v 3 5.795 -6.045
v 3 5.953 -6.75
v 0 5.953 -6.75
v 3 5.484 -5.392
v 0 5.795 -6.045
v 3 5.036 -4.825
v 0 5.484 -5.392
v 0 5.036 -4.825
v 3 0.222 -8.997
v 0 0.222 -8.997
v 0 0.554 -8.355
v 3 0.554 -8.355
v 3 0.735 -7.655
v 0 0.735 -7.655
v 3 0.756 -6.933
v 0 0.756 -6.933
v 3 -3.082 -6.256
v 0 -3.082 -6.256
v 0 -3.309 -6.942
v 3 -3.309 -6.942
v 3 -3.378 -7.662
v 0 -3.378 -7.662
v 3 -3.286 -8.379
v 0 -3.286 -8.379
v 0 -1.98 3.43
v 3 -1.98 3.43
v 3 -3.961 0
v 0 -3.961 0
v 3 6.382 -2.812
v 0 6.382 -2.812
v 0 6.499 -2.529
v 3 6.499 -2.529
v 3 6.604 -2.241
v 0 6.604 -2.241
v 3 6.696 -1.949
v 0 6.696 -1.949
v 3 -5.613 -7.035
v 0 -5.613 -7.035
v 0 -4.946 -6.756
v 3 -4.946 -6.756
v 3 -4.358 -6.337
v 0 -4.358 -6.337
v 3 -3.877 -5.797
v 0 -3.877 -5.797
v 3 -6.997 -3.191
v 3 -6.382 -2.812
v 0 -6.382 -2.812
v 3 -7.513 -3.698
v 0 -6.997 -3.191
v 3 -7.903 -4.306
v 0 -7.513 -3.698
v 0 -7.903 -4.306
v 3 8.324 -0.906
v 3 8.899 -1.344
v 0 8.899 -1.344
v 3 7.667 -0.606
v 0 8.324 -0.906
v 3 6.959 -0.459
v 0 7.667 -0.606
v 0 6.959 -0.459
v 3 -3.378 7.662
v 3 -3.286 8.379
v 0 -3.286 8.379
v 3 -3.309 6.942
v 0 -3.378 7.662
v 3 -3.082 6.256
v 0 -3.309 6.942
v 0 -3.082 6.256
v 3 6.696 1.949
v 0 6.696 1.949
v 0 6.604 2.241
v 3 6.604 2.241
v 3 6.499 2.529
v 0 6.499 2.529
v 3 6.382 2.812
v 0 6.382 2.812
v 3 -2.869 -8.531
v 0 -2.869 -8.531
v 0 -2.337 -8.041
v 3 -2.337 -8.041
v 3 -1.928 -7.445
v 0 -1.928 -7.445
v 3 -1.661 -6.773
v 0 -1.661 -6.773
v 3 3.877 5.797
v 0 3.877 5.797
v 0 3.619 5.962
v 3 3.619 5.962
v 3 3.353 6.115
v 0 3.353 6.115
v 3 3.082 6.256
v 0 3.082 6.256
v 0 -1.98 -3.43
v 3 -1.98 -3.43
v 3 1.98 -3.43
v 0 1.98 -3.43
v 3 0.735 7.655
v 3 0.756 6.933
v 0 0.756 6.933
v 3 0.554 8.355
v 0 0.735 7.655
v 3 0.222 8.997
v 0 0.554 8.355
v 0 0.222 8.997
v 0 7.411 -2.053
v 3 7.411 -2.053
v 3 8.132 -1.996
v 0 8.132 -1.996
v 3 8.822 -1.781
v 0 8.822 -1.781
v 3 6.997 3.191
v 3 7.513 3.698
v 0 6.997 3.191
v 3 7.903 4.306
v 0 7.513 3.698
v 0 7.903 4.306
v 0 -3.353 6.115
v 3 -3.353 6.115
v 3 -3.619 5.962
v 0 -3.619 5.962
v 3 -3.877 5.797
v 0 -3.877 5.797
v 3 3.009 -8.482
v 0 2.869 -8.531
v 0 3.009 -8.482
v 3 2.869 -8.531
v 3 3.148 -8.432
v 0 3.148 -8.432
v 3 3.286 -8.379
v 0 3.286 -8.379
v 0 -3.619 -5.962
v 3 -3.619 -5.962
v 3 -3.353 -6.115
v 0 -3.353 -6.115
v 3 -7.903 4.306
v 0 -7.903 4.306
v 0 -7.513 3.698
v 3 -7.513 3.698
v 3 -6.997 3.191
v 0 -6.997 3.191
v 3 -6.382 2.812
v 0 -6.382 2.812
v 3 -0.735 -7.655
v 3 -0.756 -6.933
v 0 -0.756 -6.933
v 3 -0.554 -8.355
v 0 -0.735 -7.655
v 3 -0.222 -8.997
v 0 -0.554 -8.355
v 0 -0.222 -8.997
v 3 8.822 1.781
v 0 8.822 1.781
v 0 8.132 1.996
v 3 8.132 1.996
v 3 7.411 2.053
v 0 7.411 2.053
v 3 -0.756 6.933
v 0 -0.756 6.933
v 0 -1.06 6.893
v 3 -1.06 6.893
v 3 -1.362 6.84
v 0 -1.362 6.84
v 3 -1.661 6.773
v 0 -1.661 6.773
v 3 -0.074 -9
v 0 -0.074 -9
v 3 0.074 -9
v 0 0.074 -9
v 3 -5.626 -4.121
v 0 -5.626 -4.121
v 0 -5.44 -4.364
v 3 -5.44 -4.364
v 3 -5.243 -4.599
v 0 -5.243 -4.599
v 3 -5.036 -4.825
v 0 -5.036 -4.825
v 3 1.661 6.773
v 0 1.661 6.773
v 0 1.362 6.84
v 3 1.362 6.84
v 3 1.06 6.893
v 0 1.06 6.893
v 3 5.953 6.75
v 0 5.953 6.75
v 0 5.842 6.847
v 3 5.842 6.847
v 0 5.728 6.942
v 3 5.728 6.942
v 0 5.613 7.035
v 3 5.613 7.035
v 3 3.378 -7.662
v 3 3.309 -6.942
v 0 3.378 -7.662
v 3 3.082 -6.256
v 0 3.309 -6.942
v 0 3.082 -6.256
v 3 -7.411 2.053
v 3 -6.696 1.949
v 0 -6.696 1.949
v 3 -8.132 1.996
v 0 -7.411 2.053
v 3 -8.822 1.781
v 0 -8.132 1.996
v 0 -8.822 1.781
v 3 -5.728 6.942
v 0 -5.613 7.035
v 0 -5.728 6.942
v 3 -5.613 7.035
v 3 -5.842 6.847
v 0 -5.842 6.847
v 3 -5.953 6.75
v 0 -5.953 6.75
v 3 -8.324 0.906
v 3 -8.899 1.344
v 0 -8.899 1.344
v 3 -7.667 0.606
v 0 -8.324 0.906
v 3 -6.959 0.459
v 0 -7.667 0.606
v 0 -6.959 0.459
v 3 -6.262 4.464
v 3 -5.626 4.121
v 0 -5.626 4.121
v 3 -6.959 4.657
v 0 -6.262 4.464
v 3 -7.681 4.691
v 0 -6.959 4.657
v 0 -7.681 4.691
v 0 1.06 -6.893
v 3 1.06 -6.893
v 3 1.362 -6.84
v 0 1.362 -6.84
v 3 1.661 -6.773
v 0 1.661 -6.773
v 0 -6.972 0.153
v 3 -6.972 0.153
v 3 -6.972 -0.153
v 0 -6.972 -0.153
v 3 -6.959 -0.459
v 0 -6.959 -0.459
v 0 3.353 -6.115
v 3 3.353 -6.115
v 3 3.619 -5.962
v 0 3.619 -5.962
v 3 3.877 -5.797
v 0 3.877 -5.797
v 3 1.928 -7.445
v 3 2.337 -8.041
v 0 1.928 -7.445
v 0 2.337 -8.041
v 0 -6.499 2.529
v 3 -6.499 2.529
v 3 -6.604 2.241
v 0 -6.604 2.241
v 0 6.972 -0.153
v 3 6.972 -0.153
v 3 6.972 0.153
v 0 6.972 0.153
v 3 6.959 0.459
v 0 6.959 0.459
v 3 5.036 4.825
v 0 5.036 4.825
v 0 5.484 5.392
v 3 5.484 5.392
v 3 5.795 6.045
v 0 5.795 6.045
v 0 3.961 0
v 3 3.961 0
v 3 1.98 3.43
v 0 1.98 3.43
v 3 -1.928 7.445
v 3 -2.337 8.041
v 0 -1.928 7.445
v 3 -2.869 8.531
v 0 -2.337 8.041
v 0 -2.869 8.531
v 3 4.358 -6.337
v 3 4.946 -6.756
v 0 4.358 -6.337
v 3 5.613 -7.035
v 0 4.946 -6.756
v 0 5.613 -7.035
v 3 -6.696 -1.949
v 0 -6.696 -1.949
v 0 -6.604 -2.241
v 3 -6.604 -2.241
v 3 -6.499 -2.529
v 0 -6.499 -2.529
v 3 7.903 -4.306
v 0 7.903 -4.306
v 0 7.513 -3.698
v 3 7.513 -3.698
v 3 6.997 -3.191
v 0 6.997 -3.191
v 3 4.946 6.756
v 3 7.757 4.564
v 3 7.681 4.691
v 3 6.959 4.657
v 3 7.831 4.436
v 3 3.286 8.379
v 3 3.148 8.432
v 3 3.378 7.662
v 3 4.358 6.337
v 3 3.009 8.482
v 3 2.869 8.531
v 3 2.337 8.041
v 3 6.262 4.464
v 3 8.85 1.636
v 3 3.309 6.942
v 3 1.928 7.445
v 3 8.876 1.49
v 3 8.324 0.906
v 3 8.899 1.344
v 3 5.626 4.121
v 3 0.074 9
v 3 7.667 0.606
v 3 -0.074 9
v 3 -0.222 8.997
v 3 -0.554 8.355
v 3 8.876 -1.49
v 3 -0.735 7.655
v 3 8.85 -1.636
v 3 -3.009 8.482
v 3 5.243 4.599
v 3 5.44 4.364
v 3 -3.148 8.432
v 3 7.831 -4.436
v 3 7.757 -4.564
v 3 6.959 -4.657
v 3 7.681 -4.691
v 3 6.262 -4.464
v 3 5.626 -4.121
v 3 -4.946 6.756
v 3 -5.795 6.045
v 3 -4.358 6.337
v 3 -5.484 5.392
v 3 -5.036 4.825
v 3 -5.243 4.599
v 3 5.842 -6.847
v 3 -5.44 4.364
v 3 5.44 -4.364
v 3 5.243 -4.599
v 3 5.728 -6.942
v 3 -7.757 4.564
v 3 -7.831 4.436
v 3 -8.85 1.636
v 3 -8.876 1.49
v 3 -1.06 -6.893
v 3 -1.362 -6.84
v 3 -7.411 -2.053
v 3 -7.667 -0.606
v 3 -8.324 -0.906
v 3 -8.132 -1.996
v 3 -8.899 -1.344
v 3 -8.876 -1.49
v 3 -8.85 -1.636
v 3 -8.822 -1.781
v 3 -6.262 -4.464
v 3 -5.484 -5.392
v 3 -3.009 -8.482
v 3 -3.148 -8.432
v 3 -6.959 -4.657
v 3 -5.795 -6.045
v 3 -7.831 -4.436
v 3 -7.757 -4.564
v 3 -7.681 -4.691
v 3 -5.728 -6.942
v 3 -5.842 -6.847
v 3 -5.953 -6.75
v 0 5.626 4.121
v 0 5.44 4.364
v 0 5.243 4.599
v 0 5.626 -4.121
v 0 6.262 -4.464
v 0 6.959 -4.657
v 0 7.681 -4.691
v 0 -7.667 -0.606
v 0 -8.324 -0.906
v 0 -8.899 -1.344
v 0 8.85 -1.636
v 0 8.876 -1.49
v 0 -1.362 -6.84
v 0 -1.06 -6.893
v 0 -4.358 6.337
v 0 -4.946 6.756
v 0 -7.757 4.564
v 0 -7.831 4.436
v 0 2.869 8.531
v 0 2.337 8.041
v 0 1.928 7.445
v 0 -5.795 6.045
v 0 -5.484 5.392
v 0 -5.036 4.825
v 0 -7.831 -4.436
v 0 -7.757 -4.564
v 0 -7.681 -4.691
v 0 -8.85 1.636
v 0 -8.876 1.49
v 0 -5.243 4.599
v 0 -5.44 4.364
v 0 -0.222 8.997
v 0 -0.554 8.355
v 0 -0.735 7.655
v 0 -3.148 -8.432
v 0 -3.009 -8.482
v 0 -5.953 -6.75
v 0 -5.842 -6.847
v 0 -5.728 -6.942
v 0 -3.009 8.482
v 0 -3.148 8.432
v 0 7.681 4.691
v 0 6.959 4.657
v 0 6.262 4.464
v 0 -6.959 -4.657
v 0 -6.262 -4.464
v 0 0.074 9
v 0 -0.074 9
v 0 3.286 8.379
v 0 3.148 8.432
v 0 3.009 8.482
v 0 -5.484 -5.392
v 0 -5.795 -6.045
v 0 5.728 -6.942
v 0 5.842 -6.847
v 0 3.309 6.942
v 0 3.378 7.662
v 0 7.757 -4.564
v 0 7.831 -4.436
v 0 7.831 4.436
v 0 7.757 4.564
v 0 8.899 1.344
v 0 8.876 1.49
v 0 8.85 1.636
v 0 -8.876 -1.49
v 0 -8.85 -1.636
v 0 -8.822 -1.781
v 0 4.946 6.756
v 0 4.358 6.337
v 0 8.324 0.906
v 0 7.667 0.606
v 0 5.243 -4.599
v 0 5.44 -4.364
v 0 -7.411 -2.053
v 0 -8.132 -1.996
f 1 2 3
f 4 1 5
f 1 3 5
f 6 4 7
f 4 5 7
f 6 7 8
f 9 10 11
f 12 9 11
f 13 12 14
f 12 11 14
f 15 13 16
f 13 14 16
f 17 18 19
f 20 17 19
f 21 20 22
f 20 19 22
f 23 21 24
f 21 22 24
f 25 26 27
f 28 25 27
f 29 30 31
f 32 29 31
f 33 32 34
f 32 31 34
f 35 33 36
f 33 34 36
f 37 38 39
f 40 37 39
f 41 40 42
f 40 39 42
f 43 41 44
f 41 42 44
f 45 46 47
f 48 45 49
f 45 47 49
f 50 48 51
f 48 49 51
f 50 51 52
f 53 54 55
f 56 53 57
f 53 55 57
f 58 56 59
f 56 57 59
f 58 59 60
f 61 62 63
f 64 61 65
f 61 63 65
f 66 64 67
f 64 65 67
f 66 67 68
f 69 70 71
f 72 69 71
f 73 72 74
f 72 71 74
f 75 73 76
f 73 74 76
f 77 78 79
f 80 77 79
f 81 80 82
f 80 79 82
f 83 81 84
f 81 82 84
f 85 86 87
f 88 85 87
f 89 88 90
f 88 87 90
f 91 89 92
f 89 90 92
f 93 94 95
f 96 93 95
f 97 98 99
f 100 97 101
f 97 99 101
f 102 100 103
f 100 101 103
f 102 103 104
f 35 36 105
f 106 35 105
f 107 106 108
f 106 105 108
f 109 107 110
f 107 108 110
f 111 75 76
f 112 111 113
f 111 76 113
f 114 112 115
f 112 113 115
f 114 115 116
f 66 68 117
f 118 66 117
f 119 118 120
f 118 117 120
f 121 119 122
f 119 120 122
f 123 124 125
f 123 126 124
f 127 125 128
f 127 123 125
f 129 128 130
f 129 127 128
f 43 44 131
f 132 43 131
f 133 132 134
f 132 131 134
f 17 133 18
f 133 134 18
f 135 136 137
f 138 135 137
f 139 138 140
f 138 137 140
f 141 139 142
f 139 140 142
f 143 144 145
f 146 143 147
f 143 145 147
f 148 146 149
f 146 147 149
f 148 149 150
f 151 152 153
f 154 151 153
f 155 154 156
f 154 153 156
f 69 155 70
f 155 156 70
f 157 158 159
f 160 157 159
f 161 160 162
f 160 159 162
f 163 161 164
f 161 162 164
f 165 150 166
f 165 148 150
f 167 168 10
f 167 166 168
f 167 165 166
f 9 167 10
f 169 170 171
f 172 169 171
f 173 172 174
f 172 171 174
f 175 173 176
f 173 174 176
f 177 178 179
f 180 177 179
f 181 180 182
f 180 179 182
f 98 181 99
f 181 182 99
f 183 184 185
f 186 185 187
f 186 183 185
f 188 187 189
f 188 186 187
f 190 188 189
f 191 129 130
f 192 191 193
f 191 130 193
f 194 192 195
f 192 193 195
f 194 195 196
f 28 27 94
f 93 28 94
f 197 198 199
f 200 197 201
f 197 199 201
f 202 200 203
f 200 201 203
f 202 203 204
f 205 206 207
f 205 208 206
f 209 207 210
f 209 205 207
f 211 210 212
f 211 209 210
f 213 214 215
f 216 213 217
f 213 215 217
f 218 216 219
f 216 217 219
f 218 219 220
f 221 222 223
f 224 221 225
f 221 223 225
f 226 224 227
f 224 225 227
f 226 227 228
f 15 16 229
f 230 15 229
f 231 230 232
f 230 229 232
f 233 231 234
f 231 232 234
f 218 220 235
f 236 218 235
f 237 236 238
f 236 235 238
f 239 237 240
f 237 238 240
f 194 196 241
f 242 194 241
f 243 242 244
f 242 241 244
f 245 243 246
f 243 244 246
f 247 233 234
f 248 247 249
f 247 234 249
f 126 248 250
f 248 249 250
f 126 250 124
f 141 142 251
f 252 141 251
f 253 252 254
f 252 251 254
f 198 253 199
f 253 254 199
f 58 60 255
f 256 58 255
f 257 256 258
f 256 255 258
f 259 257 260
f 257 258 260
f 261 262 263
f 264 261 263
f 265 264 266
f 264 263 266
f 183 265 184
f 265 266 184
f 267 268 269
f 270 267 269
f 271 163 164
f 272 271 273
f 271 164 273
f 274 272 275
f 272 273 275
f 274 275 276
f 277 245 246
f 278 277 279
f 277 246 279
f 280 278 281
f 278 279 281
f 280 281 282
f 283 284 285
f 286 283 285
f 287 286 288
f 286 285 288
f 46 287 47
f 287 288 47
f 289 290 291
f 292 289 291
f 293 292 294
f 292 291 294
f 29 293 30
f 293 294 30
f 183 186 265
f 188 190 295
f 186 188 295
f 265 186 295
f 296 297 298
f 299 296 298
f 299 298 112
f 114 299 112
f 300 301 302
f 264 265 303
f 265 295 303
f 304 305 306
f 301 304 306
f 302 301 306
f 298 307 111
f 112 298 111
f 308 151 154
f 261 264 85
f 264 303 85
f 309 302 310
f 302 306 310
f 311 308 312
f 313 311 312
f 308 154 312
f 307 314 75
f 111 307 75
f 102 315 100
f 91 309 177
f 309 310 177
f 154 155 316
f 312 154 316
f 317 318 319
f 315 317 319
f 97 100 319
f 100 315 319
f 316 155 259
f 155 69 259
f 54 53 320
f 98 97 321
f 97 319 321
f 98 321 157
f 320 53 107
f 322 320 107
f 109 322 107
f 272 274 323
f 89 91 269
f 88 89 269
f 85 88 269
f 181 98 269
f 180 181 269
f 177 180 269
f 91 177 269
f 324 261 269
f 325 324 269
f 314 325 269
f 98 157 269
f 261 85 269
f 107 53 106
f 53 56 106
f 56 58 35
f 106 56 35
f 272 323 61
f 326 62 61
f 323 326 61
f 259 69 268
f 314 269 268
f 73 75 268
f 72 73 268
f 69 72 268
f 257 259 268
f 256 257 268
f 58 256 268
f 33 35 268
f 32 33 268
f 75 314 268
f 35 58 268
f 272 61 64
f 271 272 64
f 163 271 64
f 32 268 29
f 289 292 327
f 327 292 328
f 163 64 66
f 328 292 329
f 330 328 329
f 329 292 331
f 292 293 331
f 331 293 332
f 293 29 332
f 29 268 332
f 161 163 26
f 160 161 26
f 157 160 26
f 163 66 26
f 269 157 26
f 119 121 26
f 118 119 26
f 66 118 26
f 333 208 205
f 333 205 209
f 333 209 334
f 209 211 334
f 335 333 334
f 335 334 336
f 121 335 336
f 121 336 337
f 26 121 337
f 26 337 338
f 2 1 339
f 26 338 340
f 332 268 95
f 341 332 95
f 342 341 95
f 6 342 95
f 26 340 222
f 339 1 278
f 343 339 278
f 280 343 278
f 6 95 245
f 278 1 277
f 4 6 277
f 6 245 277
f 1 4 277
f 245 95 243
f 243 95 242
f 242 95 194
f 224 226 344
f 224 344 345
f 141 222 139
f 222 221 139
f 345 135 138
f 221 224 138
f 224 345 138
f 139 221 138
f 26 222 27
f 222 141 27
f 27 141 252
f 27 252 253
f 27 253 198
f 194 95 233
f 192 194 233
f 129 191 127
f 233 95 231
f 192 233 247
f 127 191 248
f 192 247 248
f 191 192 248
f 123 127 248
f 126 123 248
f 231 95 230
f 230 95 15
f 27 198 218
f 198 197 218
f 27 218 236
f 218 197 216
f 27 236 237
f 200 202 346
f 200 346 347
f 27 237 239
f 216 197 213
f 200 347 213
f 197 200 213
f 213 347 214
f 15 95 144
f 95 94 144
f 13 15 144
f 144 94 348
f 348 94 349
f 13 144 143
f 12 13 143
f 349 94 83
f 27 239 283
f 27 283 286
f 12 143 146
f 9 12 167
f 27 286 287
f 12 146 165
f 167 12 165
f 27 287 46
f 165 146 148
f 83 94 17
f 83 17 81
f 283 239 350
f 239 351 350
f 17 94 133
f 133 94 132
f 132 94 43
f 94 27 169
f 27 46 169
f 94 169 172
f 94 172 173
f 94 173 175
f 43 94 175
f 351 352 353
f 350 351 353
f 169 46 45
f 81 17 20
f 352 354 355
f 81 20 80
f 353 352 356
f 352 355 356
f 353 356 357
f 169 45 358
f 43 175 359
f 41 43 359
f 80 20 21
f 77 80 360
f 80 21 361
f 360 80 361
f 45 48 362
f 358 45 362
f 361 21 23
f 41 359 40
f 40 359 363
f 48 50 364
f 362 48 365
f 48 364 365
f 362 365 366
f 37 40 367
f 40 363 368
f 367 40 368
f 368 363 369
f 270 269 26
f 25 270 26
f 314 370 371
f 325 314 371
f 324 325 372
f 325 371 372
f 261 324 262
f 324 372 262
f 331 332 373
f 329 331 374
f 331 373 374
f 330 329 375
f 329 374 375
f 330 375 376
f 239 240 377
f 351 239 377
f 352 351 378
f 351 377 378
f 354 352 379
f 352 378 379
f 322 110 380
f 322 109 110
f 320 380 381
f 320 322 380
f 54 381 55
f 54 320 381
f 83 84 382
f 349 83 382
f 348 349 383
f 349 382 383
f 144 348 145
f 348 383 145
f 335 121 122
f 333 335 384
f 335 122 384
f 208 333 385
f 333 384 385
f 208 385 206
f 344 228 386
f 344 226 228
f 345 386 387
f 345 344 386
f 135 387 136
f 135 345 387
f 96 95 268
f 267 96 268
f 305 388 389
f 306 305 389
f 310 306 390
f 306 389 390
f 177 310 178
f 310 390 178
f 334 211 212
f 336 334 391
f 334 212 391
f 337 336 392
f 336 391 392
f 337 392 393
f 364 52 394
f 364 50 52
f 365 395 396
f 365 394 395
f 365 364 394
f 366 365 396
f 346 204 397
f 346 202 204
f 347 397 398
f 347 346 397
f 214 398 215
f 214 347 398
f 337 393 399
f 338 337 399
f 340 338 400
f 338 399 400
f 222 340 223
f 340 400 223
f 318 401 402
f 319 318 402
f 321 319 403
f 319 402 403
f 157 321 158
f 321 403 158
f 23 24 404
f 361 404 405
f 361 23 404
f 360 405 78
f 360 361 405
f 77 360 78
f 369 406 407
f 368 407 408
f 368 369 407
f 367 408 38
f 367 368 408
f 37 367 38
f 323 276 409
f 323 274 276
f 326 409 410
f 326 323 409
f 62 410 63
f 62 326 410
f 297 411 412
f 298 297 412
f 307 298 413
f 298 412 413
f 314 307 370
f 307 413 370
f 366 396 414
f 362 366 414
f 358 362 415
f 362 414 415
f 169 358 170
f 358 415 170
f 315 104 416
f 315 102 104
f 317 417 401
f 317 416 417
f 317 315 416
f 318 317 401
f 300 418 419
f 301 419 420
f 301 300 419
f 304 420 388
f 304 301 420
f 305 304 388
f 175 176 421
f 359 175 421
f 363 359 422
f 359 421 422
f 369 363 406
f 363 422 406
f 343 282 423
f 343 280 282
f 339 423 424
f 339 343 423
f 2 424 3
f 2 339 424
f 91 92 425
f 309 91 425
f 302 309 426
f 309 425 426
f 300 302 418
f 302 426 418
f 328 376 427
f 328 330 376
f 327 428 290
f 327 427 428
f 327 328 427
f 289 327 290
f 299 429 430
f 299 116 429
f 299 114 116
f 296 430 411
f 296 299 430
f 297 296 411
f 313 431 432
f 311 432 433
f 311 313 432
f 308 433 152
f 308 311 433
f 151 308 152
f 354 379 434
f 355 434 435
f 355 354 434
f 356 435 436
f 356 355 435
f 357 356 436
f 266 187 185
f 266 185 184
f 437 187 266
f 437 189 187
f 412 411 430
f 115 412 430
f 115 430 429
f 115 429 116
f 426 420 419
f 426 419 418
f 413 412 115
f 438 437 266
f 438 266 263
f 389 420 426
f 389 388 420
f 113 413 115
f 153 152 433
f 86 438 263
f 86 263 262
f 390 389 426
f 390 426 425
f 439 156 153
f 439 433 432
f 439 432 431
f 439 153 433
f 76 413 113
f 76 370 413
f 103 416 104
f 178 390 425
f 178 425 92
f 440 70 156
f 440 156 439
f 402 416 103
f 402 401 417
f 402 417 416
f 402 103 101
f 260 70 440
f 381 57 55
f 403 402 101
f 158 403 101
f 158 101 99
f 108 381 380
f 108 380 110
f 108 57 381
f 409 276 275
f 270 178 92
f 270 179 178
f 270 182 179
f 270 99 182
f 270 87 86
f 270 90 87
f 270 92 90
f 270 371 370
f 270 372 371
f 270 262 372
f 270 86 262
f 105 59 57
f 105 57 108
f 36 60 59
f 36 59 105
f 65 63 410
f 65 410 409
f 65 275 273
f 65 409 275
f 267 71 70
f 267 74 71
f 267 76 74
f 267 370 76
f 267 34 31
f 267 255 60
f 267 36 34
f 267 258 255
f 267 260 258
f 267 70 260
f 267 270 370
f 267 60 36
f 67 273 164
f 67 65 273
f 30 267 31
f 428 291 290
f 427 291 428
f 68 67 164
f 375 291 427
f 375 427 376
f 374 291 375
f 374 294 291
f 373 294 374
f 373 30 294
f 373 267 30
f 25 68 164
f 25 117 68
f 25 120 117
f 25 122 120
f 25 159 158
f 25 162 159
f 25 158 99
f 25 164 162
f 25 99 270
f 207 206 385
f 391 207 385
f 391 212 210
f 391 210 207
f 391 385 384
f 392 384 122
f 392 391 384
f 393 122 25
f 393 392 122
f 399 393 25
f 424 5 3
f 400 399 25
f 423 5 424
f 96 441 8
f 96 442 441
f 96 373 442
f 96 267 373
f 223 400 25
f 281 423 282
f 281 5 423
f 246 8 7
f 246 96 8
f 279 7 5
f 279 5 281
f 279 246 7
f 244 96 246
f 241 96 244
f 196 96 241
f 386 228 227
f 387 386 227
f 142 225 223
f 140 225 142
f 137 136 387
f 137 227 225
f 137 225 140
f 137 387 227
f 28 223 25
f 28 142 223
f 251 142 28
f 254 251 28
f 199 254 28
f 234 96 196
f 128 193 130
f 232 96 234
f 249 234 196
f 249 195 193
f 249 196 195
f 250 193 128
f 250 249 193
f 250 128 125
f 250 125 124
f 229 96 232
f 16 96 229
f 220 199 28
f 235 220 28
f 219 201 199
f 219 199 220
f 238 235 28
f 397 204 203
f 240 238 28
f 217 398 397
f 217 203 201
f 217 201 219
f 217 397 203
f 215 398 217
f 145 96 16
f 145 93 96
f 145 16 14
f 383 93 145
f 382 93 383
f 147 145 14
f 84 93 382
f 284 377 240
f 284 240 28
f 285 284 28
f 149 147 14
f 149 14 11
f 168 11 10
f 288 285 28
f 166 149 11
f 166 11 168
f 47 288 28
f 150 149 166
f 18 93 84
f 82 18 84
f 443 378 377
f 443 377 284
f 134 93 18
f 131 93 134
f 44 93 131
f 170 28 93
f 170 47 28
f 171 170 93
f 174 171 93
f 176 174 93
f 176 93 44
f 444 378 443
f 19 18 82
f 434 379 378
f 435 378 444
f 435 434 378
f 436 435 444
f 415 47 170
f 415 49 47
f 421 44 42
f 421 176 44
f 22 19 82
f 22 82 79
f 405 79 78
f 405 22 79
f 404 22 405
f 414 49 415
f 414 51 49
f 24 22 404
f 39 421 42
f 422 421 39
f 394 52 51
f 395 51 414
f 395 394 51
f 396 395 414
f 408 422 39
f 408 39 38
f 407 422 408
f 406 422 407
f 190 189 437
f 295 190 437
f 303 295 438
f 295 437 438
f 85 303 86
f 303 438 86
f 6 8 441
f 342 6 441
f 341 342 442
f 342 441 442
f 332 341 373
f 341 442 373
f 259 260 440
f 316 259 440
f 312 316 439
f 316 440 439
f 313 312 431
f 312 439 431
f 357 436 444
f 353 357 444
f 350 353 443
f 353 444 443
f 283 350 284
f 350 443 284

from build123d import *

# Parameters (mm, degrees)
BASPROSKE_W        = 3
BASPROSKE_H        = 9
TOOTHCUT_DEPTH     = 14.076696831
TEETHCUTS_COUNT    = 18
TEETHCUTS_ANGLE    = 340
CUT_EXTRUDE1_DEPTH = 14.007462246


with BuildPart() as part:
    # BasProSke → Base-Revolve (revolve)
    with BuildSketch(Plane(origin=(0, 0, 0), x_dir=(1, 0, 0), z_dir=(0, 1, 0)), mode=Mode.PRIVATE) as base_revolve_sk:
        with Locations((1.5, 4.5)):
            Rectangle(BASPROSKE_W, BASPROSKE_H)
    revolve(base_revolve_sk.sketch.rotate(Axis((-10, 0, 0), (1, 0, 0)), 180), axis=Axis((-10, 0, 0), (1, 0, 0)))

    # TooCutSke → ToothCut (cut, through all)
    with BuildSketch(Plane(origin=(0, 0, 0), x_dir=(0, 0, -1), z_dir=(1, 0, 0))):
        with BuildLine():
            ThreePointArc((0.45926649, 6.958861278), (0, 6.974), (-0.45926649, 6.958861278))
            ThreePointArc((-0.45926649, 6.958861278), (-0.743858876, 8.01799277), (-1.365479267, 8.921508366))
            ThreePointArc((-1.365479267, 8.921508366), (0, 9.0254), (1.365479267, 8.921508366))
            ThreePointArc((1.365479267, 8.921508366), (0.743858876, 8.01799277), (0.45926649, 6.958861278))
        make_face()
    toothcut = extrude(amount=TOOTHCUT_DEPTH, mode=Mode.SUBTRACT)

    # TeethCuts: ToothCut ×18 about axis
    teethcuts_axis = Axis((-10, 0, 0), (1, 0, 0))
    for i in range(1, TEETHCUTS_COUNT):
        add(toothcut.rotate(teethcuts_axis, i * TEETHCUTS_ANGLE / (TEETHCUTS_COUNT - 1)), mode=Mode.SUBTRACT)

    # Sketch1 → Cut-Extrude1 (cut, through all)
    with BuildSketch(Plane(origin=(3, 0, 0), x_dir=(0, 0, -1), z_dir=(1, 0, 0))):
        Polygon((0, 3.960622847), (-3.43, 1.980311423), (-3.43, -1.980311423), (0, -3.960622847), (3.43, -1.980311423), (3.43, 1.980311423), align=None)
    extrude(amount=-CUT_EXTRUDE1_DEPTH, mode=Mode.SUBTRACT)


solid = part.part
